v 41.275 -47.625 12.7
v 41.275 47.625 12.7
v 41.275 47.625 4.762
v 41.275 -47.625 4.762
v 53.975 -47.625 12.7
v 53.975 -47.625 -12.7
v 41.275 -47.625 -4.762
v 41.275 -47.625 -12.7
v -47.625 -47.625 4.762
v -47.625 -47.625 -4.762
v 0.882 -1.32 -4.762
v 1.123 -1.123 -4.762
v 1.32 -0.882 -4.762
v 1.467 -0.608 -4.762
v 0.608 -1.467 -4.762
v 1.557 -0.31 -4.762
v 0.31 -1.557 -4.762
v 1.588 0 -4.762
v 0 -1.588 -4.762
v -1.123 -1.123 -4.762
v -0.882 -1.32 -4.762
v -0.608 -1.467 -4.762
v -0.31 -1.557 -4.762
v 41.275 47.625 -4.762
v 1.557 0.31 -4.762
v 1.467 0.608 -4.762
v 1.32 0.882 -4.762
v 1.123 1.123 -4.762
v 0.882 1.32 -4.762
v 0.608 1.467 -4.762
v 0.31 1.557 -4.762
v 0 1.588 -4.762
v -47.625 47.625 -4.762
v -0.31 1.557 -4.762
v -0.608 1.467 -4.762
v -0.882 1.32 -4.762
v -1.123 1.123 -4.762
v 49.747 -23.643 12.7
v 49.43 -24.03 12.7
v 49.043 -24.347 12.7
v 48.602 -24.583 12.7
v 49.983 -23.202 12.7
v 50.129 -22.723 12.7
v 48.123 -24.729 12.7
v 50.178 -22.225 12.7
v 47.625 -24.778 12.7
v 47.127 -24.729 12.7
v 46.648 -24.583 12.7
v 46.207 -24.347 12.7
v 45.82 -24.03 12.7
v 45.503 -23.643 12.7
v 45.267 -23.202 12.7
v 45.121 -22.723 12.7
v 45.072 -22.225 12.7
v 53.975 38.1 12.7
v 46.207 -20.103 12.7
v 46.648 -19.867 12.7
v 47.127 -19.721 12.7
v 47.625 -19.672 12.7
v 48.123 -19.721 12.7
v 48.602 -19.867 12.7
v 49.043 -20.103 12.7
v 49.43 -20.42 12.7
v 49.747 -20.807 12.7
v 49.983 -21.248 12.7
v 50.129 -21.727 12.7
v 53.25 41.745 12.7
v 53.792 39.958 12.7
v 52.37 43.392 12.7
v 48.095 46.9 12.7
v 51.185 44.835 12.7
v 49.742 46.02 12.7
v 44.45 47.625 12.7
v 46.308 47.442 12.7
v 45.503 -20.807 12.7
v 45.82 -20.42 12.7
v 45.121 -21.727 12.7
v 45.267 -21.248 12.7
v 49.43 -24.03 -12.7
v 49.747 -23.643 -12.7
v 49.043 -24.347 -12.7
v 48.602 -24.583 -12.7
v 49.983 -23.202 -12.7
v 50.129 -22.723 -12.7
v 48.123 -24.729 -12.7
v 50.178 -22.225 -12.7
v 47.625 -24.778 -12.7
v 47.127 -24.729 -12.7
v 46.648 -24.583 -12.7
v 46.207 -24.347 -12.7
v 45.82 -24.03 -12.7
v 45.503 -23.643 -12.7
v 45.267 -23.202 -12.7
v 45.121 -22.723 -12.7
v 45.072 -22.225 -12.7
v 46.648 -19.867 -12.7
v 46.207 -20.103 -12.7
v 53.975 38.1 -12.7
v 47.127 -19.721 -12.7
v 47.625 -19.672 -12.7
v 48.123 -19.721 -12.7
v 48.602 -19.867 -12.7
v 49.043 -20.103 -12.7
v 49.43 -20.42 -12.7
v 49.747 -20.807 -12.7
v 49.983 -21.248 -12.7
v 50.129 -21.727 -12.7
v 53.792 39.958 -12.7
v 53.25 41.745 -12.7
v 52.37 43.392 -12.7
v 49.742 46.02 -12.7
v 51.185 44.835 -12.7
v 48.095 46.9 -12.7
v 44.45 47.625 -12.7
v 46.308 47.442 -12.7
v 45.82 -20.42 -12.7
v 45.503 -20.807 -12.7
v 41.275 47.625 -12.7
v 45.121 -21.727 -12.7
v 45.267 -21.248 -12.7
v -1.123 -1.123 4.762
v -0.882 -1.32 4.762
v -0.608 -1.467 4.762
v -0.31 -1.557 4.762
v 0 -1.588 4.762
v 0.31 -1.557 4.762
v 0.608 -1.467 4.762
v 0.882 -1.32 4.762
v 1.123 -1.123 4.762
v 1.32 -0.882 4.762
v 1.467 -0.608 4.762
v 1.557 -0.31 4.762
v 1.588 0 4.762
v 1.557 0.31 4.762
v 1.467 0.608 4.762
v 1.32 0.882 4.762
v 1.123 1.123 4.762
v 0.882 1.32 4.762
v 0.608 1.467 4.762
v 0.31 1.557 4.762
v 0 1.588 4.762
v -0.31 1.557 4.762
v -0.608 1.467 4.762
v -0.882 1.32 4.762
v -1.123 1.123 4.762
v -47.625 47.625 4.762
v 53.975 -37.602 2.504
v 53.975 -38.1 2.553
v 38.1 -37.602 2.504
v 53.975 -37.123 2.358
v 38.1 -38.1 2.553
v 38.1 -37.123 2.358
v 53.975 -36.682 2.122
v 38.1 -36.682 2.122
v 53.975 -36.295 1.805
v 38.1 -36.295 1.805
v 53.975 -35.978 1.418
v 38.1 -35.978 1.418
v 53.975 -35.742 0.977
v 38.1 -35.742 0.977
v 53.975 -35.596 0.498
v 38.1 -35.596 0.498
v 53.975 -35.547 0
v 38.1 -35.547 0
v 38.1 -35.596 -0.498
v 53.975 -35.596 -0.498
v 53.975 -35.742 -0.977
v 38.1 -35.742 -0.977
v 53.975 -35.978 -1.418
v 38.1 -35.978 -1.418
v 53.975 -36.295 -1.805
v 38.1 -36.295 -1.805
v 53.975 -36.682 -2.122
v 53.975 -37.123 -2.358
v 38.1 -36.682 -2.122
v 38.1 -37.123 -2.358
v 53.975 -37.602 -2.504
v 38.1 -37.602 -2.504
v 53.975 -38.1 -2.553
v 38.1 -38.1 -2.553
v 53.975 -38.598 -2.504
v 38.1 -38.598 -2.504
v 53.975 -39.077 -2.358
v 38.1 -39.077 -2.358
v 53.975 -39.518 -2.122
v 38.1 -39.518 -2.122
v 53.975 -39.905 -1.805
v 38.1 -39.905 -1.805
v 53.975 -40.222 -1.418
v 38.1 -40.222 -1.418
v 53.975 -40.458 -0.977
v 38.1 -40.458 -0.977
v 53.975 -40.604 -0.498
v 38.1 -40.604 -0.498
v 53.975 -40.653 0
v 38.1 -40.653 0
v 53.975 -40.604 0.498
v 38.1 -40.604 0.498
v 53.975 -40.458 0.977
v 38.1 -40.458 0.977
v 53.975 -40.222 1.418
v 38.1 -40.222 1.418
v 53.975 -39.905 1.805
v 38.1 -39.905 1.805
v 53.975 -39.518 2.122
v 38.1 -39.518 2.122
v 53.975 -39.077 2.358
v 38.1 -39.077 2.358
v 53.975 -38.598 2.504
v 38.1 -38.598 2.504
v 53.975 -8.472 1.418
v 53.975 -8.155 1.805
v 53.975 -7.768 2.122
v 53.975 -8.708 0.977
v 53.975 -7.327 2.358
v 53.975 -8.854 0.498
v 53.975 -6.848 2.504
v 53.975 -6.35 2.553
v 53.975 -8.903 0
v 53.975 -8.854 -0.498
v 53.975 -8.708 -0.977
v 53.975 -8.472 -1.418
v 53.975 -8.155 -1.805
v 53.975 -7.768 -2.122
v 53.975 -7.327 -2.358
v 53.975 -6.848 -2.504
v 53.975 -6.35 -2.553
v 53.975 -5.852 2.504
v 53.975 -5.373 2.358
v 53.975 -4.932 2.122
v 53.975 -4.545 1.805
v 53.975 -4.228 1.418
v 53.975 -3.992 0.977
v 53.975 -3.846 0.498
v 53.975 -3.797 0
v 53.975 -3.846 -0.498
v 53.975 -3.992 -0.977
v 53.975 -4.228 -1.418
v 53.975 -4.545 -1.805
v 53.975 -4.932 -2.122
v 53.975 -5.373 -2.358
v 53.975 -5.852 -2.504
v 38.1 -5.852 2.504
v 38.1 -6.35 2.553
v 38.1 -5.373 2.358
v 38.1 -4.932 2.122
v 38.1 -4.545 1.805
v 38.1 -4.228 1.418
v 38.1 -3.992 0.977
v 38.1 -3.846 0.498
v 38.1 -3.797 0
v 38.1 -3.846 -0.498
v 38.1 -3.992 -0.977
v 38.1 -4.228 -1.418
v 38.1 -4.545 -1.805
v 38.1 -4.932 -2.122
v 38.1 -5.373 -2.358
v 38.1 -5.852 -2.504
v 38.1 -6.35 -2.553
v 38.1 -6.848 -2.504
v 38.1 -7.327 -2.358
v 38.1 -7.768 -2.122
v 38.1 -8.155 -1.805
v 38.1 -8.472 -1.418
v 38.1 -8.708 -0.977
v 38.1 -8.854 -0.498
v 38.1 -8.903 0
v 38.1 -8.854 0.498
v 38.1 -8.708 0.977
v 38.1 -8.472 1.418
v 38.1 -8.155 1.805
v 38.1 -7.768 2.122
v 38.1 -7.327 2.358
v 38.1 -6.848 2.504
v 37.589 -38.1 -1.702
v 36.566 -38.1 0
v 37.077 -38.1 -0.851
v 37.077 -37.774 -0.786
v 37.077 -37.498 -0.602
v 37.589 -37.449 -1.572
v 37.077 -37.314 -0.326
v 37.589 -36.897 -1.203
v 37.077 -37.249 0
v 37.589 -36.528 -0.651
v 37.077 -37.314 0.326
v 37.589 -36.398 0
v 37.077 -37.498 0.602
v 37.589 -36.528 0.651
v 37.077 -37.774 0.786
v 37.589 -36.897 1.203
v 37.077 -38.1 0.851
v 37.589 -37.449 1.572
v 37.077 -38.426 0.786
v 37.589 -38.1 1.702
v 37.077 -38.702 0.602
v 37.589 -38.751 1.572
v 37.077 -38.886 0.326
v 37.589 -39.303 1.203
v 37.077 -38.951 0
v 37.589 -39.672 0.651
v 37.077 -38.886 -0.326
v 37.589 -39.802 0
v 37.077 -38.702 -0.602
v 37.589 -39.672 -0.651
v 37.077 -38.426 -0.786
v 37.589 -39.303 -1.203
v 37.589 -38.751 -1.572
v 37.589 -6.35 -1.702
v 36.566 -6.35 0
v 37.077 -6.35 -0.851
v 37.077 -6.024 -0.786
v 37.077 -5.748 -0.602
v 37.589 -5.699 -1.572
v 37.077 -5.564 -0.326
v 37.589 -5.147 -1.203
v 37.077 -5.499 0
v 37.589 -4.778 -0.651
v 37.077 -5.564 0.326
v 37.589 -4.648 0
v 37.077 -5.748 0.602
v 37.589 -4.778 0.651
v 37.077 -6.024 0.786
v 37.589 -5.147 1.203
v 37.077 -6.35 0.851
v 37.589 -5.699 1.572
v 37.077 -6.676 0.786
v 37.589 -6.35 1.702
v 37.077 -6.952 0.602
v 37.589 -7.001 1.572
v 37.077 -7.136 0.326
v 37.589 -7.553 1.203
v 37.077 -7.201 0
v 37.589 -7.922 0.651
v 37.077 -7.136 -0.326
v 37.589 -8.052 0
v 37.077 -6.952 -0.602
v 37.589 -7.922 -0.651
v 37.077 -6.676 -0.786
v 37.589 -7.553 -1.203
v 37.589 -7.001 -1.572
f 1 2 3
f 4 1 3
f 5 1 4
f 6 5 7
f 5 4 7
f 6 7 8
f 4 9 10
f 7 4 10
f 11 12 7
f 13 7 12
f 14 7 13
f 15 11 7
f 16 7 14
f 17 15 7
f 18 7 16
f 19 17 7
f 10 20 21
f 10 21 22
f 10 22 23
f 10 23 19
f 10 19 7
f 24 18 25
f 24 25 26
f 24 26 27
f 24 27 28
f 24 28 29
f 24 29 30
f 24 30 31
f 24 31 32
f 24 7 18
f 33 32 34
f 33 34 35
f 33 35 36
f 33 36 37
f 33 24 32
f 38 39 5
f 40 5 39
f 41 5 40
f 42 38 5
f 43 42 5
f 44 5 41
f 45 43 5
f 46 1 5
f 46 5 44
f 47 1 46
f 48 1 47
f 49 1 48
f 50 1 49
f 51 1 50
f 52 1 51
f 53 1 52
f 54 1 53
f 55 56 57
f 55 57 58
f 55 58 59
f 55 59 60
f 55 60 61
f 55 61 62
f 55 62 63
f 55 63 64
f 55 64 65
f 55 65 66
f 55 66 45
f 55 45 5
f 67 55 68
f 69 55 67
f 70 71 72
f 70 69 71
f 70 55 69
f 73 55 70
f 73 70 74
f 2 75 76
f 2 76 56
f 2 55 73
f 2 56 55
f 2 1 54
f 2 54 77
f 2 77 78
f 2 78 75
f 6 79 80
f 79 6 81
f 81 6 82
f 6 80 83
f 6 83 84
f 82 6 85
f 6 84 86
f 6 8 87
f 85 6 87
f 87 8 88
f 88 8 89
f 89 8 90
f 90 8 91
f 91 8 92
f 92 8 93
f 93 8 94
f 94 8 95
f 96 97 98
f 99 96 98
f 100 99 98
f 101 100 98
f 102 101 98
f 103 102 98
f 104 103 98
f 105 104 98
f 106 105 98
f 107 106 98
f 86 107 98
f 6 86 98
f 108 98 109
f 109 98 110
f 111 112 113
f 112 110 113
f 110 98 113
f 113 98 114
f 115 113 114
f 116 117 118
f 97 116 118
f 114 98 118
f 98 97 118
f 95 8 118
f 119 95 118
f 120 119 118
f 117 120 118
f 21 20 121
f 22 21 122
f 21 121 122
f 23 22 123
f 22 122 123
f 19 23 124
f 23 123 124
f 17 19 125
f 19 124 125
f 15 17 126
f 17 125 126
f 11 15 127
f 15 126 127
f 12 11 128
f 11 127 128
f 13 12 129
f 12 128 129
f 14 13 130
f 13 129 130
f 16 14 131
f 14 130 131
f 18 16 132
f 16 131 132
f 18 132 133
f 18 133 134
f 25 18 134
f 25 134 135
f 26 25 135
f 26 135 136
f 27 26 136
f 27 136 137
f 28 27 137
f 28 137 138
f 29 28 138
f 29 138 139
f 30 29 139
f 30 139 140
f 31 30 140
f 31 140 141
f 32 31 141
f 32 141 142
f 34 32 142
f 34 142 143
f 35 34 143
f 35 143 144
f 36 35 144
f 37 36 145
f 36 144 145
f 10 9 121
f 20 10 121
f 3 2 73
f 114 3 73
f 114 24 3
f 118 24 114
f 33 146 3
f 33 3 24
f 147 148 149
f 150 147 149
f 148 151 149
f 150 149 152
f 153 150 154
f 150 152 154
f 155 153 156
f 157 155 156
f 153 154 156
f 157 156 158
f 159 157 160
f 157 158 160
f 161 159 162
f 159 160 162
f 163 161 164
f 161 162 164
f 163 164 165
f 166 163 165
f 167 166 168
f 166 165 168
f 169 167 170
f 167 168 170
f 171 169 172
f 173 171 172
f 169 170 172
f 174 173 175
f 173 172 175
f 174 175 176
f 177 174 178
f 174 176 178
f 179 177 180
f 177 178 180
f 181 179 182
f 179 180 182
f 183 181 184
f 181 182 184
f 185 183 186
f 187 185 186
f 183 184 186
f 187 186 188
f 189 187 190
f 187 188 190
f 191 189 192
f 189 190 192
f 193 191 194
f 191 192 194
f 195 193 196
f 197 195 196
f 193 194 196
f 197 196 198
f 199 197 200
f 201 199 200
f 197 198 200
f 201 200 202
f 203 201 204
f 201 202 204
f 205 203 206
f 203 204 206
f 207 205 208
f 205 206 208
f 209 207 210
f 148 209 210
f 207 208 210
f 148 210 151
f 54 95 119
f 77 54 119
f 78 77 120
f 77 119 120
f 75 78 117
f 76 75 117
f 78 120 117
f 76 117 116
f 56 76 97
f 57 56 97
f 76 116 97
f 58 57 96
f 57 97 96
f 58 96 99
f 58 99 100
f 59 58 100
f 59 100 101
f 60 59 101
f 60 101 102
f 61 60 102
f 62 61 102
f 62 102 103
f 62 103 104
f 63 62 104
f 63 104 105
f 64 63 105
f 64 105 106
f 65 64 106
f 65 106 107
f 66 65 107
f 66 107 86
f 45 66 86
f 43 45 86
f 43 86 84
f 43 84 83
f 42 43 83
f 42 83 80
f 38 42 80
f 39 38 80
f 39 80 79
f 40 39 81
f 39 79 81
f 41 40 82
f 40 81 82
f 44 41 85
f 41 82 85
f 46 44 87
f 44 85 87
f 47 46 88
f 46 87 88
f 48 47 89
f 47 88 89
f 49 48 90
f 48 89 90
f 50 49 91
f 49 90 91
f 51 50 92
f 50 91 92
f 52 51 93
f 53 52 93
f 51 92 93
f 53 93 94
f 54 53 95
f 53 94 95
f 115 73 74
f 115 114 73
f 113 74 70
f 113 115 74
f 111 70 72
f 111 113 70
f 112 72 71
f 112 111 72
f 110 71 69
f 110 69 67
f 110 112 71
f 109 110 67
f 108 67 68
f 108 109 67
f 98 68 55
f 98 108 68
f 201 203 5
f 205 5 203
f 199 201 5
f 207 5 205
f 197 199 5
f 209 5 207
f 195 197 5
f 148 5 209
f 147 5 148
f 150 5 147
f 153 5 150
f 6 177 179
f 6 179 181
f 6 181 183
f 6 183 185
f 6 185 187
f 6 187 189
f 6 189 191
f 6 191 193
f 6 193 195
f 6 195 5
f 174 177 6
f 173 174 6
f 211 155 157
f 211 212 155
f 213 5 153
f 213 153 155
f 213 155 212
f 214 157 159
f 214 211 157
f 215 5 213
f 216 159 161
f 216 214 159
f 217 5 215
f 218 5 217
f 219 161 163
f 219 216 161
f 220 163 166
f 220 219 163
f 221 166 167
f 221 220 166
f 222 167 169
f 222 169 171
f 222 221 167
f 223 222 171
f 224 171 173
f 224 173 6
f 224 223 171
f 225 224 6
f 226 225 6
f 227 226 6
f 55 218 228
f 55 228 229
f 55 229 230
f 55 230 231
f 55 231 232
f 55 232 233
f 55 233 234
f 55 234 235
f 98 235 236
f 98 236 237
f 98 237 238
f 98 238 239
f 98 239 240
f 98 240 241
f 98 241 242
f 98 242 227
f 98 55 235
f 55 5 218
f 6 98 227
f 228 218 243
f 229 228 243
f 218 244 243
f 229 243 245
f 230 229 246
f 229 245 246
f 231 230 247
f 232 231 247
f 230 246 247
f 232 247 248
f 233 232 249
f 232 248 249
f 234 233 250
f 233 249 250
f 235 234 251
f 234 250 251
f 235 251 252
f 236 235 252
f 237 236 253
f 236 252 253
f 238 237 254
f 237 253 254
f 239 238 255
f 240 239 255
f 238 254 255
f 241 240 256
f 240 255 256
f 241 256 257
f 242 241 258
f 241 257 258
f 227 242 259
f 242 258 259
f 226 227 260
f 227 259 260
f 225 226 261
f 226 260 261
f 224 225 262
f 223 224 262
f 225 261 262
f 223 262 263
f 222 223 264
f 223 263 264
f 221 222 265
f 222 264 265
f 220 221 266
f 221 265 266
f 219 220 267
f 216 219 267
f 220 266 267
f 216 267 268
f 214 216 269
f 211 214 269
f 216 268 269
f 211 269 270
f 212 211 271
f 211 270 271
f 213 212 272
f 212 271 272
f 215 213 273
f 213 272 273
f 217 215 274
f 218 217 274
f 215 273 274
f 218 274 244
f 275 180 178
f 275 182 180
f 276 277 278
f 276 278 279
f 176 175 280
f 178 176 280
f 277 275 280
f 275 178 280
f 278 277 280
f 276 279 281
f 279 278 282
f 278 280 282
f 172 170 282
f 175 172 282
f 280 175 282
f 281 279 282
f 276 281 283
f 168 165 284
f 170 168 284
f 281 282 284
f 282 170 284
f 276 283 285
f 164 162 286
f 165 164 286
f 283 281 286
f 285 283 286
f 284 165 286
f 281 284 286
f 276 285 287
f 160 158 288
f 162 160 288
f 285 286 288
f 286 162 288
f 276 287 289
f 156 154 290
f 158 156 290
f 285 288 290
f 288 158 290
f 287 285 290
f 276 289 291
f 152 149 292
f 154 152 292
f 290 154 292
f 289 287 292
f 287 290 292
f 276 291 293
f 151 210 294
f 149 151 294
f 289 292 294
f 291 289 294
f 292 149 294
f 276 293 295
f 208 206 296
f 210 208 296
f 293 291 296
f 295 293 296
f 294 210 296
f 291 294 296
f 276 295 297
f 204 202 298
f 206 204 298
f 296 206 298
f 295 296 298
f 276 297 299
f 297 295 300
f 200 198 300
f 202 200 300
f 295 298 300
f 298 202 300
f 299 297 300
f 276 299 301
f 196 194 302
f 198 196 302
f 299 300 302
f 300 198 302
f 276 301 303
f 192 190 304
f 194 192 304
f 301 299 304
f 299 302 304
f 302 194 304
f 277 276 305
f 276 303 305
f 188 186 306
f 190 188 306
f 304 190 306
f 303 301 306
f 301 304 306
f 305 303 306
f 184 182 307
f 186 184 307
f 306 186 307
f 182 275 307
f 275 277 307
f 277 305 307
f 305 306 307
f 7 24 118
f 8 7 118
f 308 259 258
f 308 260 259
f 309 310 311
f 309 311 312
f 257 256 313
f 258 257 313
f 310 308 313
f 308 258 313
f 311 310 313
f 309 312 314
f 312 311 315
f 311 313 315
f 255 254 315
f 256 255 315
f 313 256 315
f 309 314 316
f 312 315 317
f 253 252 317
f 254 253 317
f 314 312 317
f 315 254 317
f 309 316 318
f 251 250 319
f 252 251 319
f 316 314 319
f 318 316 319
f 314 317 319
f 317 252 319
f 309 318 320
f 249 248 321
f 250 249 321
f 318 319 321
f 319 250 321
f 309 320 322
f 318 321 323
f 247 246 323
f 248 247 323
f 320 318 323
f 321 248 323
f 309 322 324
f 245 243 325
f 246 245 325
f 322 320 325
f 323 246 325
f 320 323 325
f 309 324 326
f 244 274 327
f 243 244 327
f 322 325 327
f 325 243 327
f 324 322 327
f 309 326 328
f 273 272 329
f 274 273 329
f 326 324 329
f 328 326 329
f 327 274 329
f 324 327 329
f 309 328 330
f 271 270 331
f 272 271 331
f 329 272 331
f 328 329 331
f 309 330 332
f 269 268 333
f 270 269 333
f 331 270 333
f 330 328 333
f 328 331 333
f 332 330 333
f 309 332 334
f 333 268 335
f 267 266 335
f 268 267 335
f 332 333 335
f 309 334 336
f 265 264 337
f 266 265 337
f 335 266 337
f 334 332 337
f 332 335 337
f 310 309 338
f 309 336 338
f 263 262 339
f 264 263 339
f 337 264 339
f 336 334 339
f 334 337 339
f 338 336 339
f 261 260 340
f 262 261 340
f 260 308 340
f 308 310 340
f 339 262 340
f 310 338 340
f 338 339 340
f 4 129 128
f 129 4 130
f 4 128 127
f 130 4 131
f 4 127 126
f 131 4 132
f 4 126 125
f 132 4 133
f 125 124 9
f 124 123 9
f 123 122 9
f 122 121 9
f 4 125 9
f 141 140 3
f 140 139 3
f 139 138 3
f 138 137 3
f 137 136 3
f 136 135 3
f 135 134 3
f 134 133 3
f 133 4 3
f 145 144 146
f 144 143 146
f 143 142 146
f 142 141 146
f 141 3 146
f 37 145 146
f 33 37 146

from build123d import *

# Parameters (mm, degrees)
BOSS_EXTRUDE1_DEPTH         = 4.7625
SKETCH2_R                   = 1.5875
CUT_EXTRUDE1_DEPTH          = 10.525
SKETCH3_W                   = 25.4
SKETCH3_H                   = 95.25
BOSS_EXTRUDE2_DEPTH         = 12.7
FILLET1_R                   = 9.525
F_1_4_20_TAPPED_HOLE1_D     = 5.1054
F_1_4_20_TAPPED_HOLE1_DEPTH = 15.875
F_1_4_20_TAPPED_HOLE1_TIP   = 1.533816902
F_1_4_20_TAPPED_HOLE2_D     = 5.1054


with BuildPart() as part:
    # Sketch1 → Boss-Extrude1 (new body, symmetric)
    with BuildSketch(Plane.XY):
        Polygon((-47.625, 47.625), (41.275, 47.625), (41.275, -47.625), (-47.625, -47.625), (0, 0), align=None)
    extrude(amount=BOSS_EXTRUDE1_DEPTH, both=True)

    # Sketch2 → Cut-Extrude1 (cut, through all)
    with BuildSketch(Plane.XY.offset(4.7625)):
        Circle(SKETCH2_R)
    extrude(amount=-CUT_EXTRUDE1_DEPTH, mode=Mode.SUBTRACT)

    # Sketch3 → Boss-Extrude2 (add)
    with BuildSketch(Plane(origin=(41.275, 0, 0), x_dir=(0, 0, -1), z_dir=(1, 0, 0))):
        Rectangle(SKETCH3_W, SKETCH3_H)
    extrude(amount=BOSS_EXTRUDE2_DEPTH)

    # Fillet1
    fillet1_edges = [part.edges().sort_by_distance(p)[0] for p in [
        (53.975, 47.625, 0),
    ]]
    fillet(fillet1_edges, radius=FILLET1_R)

    # 1/4-20 Tapped Hole1
    with Locations(Plane(origin=(53.975, 0, 0), x_dir=(0, 0, -1), z_dir=(1, 0, 0))):
        with Locations((0, -38.1), (0, -6.35)):
            Hole(F_1_4_20_TAPPED_HOLE1_D / 2, depth=F_1_4_20_TAPPED_HOLE1_DEPTH)
            with Locations((0, 0, -(F_1_4_20_TAPPED_HOLE1_DEPTH + F_1_4_20_TAPPED_HOLE1_TIP / 2))):  # 118° drill point
                Cone(0, F_1_4_20_TAPPED_HOLE1_D / 2, F_1_4_20_TAPPED_HOLE1_TIP, mode=Mode.SUBTRACT)

    # 1/4-20 Tapped Hole2 (through all)
    with Locations(Plane.XY.offset(12.7)):
        with Locations((47.625, -22.225)):
            Hole(F_1_4_20_TAPPED_HOLE2_D / 2)


solid = part.part
